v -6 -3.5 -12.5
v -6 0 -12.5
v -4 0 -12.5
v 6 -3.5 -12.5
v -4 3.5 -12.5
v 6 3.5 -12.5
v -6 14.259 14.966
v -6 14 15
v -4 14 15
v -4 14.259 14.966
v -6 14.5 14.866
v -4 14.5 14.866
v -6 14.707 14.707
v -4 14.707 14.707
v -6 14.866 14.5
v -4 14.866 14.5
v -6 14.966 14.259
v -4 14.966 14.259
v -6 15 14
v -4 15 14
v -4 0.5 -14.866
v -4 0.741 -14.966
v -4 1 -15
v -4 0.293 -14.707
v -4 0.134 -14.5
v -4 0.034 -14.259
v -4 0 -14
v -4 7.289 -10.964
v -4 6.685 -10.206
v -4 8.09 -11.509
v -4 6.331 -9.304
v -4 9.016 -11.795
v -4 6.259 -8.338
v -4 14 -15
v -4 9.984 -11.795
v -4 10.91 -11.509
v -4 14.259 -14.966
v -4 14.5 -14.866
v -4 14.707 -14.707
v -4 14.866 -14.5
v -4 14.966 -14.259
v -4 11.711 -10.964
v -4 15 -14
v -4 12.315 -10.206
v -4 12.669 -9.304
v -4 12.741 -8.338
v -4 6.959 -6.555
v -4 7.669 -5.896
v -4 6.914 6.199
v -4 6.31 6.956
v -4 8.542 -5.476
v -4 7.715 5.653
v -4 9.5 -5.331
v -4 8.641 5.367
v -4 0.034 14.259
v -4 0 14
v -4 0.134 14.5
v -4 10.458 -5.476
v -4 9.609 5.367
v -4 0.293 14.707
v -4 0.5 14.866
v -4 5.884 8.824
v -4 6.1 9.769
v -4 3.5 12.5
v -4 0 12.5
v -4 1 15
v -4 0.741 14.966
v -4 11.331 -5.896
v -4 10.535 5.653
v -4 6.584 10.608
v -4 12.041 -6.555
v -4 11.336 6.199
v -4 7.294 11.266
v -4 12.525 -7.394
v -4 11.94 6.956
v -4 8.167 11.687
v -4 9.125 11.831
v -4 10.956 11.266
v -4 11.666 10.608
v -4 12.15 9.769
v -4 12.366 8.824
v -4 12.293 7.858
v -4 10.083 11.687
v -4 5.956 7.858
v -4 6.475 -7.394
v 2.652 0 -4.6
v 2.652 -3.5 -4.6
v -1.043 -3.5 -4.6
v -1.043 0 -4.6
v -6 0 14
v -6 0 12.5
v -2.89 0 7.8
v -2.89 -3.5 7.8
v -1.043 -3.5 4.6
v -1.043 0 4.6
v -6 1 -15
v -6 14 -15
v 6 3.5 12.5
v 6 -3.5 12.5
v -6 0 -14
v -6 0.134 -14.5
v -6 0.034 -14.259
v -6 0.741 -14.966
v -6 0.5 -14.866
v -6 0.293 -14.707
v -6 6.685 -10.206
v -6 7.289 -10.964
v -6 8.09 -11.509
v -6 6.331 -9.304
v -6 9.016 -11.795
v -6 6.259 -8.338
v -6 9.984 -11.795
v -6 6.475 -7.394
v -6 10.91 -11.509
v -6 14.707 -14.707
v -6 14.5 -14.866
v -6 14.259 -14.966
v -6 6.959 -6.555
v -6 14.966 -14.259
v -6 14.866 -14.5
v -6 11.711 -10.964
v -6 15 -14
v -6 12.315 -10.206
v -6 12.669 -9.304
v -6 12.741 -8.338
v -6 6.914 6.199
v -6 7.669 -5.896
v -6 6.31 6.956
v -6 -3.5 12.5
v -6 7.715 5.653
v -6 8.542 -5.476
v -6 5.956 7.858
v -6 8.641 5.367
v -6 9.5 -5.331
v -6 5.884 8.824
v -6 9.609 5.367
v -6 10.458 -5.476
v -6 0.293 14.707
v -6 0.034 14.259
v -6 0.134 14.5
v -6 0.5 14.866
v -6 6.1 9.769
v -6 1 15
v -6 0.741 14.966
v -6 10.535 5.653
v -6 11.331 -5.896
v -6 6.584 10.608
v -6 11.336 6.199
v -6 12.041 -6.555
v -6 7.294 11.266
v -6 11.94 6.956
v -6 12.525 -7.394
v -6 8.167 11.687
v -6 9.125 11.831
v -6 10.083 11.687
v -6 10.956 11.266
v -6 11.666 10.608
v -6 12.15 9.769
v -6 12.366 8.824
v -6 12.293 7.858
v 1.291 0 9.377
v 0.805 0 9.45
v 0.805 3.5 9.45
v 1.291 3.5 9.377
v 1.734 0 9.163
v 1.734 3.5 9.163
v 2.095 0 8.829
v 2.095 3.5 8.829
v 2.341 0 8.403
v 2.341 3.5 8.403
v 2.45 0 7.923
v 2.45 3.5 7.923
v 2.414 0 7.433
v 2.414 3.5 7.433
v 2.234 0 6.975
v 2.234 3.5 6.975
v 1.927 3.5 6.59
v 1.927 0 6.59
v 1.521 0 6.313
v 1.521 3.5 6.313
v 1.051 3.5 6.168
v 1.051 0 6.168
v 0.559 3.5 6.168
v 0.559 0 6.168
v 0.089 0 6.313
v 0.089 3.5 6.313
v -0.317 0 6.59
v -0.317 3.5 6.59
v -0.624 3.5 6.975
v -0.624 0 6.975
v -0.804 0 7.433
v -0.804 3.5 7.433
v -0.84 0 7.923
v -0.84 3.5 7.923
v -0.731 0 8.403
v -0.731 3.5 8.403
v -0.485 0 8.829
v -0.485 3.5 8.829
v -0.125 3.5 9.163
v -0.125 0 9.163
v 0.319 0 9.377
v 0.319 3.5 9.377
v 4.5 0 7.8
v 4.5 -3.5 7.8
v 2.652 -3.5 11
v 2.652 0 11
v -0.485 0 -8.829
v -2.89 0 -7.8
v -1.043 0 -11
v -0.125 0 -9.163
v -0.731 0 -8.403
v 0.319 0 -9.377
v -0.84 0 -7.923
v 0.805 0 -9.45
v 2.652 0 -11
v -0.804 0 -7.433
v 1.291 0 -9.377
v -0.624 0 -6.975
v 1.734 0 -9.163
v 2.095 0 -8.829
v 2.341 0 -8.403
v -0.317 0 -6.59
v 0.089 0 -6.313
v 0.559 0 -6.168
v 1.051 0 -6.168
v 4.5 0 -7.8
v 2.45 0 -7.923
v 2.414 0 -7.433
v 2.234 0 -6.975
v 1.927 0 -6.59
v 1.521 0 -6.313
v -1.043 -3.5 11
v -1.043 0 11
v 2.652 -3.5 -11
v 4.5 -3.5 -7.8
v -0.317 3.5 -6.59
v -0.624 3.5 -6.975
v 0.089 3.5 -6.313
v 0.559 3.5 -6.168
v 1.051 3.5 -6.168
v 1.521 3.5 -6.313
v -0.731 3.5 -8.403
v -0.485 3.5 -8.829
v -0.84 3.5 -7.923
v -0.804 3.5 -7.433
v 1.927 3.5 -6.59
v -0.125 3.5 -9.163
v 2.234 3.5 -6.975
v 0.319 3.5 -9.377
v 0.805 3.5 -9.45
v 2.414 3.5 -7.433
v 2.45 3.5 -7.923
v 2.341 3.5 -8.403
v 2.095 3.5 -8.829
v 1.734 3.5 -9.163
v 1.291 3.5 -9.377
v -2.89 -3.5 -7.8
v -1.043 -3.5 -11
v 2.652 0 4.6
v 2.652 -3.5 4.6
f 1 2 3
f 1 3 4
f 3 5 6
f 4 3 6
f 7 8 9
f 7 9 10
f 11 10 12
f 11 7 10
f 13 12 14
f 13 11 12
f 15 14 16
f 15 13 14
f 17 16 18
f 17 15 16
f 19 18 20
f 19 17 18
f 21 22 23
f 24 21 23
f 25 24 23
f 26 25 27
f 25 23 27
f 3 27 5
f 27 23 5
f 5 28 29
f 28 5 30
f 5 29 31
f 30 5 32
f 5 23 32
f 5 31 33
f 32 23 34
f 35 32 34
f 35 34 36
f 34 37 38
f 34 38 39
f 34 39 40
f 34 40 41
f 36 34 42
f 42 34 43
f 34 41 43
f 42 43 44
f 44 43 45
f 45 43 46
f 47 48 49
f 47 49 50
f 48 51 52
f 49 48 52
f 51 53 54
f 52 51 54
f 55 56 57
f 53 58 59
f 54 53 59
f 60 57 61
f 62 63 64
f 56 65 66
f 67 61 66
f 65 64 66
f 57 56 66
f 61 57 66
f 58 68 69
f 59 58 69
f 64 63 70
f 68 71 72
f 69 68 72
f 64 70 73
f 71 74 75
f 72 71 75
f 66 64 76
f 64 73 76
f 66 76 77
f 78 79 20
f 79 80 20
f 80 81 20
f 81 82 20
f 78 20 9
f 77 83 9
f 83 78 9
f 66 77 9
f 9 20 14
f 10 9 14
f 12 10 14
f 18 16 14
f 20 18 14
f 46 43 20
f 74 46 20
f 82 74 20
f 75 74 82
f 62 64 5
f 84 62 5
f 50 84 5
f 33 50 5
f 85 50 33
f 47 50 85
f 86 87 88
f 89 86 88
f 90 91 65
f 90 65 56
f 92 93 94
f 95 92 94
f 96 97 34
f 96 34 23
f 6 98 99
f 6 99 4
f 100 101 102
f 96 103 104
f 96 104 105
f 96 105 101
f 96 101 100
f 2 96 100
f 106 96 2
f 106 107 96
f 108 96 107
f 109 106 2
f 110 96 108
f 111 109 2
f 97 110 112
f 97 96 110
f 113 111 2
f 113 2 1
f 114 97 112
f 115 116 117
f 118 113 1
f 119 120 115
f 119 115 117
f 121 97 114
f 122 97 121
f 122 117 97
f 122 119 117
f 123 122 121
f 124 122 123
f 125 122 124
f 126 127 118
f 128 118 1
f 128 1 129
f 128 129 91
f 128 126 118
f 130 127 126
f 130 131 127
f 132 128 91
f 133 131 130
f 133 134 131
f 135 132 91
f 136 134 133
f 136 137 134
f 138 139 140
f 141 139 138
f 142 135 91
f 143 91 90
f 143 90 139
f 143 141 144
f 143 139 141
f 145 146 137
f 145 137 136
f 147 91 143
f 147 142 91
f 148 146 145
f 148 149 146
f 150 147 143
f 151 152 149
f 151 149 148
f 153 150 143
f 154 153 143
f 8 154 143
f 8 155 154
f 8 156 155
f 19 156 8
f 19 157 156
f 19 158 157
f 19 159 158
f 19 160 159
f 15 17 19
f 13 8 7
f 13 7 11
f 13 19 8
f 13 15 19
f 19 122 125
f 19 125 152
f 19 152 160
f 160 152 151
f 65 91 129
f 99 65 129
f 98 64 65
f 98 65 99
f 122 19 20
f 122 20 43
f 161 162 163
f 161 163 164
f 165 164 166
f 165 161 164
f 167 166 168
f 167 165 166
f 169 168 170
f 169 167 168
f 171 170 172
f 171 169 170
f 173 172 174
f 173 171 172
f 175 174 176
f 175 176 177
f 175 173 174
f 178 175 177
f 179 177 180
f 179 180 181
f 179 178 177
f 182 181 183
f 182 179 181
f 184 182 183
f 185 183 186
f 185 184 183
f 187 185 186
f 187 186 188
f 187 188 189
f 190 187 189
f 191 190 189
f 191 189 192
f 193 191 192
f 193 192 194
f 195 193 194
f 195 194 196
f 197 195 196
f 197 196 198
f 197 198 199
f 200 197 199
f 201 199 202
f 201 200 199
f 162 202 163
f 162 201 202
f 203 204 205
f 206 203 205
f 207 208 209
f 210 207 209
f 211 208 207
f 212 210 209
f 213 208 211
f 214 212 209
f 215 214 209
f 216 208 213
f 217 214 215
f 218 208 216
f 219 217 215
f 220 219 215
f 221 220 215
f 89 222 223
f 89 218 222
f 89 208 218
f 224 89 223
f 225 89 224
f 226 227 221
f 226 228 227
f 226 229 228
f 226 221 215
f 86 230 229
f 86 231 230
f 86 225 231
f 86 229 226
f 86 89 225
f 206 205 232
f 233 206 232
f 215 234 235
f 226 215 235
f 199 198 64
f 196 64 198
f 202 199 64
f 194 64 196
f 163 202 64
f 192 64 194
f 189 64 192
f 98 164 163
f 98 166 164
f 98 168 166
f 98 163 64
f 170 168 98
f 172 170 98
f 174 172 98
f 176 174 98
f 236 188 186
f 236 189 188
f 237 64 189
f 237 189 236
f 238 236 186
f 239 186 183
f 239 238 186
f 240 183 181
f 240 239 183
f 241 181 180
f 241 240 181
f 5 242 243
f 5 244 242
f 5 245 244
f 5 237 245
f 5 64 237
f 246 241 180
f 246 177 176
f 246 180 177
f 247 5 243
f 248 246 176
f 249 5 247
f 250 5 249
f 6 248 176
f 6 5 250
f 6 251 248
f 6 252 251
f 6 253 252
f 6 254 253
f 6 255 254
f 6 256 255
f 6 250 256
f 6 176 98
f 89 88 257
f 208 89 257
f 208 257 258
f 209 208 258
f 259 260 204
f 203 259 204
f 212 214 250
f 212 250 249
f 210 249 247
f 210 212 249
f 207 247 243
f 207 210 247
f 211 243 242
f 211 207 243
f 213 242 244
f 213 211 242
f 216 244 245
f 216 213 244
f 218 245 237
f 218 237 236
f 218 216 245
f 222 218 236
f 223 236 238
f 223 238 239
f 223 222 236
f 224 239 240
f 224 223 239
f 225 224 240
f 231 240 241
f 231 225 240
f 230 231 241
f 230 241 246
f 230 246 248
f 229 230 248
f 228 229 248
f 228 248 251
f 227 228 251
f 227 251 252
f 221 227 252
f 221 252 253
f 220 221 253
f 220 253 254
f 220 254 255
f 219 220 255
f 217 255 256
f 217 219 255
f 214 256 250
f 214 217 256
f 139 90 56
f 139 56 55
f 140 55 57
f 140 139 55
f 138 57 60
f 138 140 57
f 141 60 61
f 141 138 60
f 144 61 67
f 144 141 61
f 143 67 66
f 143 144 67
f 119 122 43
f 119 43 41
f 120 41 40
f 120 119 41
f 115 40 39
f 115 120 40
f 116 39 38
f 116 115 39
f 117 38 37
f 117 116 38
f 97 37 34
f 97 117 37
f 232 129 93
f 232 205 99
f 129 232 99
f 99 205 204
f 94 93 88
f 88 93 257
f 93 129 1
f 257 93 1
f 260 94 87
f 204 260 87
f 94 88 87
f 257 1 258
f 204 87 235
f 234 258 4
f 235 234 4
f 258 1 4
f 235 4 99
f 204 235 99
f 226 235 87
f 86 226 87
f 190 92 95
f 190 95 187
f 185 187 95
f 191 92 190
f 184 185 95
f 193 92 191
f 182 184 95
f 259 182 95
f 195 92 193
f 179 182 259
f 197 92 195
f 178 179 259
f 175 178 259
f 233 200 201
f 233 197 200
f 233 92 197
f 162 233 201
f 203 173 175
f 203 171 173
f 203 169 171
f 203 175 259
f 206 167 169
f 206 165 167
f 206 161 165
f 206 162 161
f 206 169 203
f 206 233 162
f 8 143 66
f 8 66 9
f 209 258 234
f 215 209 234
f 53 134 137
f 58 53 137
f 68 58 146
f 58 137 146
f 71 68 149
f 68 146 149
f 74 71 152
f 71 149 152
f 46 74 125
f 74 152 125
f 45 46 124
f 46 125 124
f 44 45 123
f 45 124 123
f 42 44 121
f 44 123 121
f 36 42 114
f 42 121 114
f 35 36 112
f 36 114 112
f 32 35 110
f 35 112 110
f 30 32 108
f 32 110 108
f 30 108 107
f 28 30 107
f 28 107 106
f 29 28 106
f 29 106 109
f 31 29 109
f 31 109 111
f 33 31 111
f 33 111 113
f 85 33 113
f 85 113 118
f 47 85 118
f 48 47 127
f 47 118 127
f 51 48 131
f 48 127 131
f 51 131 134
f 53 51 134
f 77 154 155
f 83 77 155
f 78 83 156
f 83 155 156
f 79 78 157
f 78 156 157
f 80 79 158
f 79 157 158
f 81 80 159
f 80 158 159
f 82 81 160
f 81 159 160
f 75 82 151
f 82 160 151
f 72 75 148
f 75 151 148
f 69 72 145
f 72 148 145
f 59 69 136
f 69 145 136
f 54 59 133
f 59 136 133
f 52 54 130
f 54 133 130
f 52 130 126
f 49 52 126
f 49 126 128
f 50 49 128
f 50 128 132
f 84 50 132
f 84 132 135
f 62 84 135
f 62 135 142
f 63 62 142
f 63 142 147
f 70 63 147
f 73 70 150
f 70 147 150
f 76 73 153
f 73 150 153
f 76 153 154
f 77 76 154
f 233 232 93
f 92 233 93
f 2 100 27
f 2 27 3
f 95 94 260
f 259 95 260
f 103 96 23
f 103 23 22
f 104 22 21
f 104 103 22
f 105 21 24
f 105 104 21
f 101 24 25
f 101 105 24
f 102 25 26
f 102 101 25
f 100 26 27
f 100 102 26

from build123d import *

# Parameters (mm, degrees)
SKETCH1_W           = 12
SKETCH1_H           = 25
SKETCH1_R           = 1.65
BOSS_EXTRUDE1_DEPTH = 3.5
CUT_EXTRUDE1_DEPTH  = 3.5
SKETCH3_R           = 3.25
BOSS_EXTRUDE2_DEPTH = 2


with BuildPart() as part:
    # Sketch1 → Boss-Extrude1 (new, symmetric)
    with BuildSketch(Plane(origin=(0, 0, 0), x_dir=(1, 0, 0), z_dir=(0, 1, 0))):
        Rectangle(SKETCH1_W, SKETCH1_H)
        with Locations(Location((0.804958277, -7.8, 0), (0, 0, 270))):
            Circle(SKETCH1_R, mode=Mode.SUBTRACT)
        with Locations(Location((0.804958277, 7.8, 0), (0, 0, 90))):
            Circle(SKETCH1_R, mode=Mode.SUBTRACT)
    extrude(amount=BOSS_EXTRUDE1_DEPTH, both=True)

    # Sketch2 → Cut-Extrude1 (cut)
    with BuildSketch(Plane.XZ.offset(3.5)):
        Polygon((2.652479139, 4.6), (4.5, 7.8), (2.652479139, 11), (-1.042562584, 11), (-2.890083446, 7.8), (-1.042562584, 4.6), align=None)
        Polygon((2.652479139, -11), (4.5, -7.8), (2.652479139, -4.6), (-1.042562584, -4.6), (-2.890083446, -7.8), (-1.042562584, -11), align=None)
    extrude(amount=-CUT_EXTRUDE1_DEPTH, mode=Mode.SUBTRACT)

    # Sketch3 → Boss-Extrude2 (add)
    with BuildSketch(Plane.ZY.offset(6)):
        with BuildLine():
            Line((0, 0), (14, 0))
            ThreePointArc((14, 0), (14.707106781, 0.292893219), (15, 1))
            Line((15, 1), (15, 14))
            ThreePointArc((15, 14), (14.707106781, 14.707106781), (14, 15))
            Line((14, 15), (-14, 15))
            ThreePointArc((-14, 15), (-14.707106781, 14.707106781), (-15, 14))
            Line((-15, 14), (-15, 1))
            ThreePointArc((-15, 1), (-14.707106781, 0.292893219), (-14, 0))
            Line((-14, 0), (0, 0))
        make_face()
        with Locations((-8.581197846, 9.5)):
            Circle(SKETCH3_R, mode=Mode.SUBTRACT)
        with Locations((8.581197846, 9.124939365)):
            Circle(SKETCH3_R, mode=Mode.SUBTRACT)
    extrude(amount=-BOSS_EXTRUDE2_DEPTH)


solid = part.part
